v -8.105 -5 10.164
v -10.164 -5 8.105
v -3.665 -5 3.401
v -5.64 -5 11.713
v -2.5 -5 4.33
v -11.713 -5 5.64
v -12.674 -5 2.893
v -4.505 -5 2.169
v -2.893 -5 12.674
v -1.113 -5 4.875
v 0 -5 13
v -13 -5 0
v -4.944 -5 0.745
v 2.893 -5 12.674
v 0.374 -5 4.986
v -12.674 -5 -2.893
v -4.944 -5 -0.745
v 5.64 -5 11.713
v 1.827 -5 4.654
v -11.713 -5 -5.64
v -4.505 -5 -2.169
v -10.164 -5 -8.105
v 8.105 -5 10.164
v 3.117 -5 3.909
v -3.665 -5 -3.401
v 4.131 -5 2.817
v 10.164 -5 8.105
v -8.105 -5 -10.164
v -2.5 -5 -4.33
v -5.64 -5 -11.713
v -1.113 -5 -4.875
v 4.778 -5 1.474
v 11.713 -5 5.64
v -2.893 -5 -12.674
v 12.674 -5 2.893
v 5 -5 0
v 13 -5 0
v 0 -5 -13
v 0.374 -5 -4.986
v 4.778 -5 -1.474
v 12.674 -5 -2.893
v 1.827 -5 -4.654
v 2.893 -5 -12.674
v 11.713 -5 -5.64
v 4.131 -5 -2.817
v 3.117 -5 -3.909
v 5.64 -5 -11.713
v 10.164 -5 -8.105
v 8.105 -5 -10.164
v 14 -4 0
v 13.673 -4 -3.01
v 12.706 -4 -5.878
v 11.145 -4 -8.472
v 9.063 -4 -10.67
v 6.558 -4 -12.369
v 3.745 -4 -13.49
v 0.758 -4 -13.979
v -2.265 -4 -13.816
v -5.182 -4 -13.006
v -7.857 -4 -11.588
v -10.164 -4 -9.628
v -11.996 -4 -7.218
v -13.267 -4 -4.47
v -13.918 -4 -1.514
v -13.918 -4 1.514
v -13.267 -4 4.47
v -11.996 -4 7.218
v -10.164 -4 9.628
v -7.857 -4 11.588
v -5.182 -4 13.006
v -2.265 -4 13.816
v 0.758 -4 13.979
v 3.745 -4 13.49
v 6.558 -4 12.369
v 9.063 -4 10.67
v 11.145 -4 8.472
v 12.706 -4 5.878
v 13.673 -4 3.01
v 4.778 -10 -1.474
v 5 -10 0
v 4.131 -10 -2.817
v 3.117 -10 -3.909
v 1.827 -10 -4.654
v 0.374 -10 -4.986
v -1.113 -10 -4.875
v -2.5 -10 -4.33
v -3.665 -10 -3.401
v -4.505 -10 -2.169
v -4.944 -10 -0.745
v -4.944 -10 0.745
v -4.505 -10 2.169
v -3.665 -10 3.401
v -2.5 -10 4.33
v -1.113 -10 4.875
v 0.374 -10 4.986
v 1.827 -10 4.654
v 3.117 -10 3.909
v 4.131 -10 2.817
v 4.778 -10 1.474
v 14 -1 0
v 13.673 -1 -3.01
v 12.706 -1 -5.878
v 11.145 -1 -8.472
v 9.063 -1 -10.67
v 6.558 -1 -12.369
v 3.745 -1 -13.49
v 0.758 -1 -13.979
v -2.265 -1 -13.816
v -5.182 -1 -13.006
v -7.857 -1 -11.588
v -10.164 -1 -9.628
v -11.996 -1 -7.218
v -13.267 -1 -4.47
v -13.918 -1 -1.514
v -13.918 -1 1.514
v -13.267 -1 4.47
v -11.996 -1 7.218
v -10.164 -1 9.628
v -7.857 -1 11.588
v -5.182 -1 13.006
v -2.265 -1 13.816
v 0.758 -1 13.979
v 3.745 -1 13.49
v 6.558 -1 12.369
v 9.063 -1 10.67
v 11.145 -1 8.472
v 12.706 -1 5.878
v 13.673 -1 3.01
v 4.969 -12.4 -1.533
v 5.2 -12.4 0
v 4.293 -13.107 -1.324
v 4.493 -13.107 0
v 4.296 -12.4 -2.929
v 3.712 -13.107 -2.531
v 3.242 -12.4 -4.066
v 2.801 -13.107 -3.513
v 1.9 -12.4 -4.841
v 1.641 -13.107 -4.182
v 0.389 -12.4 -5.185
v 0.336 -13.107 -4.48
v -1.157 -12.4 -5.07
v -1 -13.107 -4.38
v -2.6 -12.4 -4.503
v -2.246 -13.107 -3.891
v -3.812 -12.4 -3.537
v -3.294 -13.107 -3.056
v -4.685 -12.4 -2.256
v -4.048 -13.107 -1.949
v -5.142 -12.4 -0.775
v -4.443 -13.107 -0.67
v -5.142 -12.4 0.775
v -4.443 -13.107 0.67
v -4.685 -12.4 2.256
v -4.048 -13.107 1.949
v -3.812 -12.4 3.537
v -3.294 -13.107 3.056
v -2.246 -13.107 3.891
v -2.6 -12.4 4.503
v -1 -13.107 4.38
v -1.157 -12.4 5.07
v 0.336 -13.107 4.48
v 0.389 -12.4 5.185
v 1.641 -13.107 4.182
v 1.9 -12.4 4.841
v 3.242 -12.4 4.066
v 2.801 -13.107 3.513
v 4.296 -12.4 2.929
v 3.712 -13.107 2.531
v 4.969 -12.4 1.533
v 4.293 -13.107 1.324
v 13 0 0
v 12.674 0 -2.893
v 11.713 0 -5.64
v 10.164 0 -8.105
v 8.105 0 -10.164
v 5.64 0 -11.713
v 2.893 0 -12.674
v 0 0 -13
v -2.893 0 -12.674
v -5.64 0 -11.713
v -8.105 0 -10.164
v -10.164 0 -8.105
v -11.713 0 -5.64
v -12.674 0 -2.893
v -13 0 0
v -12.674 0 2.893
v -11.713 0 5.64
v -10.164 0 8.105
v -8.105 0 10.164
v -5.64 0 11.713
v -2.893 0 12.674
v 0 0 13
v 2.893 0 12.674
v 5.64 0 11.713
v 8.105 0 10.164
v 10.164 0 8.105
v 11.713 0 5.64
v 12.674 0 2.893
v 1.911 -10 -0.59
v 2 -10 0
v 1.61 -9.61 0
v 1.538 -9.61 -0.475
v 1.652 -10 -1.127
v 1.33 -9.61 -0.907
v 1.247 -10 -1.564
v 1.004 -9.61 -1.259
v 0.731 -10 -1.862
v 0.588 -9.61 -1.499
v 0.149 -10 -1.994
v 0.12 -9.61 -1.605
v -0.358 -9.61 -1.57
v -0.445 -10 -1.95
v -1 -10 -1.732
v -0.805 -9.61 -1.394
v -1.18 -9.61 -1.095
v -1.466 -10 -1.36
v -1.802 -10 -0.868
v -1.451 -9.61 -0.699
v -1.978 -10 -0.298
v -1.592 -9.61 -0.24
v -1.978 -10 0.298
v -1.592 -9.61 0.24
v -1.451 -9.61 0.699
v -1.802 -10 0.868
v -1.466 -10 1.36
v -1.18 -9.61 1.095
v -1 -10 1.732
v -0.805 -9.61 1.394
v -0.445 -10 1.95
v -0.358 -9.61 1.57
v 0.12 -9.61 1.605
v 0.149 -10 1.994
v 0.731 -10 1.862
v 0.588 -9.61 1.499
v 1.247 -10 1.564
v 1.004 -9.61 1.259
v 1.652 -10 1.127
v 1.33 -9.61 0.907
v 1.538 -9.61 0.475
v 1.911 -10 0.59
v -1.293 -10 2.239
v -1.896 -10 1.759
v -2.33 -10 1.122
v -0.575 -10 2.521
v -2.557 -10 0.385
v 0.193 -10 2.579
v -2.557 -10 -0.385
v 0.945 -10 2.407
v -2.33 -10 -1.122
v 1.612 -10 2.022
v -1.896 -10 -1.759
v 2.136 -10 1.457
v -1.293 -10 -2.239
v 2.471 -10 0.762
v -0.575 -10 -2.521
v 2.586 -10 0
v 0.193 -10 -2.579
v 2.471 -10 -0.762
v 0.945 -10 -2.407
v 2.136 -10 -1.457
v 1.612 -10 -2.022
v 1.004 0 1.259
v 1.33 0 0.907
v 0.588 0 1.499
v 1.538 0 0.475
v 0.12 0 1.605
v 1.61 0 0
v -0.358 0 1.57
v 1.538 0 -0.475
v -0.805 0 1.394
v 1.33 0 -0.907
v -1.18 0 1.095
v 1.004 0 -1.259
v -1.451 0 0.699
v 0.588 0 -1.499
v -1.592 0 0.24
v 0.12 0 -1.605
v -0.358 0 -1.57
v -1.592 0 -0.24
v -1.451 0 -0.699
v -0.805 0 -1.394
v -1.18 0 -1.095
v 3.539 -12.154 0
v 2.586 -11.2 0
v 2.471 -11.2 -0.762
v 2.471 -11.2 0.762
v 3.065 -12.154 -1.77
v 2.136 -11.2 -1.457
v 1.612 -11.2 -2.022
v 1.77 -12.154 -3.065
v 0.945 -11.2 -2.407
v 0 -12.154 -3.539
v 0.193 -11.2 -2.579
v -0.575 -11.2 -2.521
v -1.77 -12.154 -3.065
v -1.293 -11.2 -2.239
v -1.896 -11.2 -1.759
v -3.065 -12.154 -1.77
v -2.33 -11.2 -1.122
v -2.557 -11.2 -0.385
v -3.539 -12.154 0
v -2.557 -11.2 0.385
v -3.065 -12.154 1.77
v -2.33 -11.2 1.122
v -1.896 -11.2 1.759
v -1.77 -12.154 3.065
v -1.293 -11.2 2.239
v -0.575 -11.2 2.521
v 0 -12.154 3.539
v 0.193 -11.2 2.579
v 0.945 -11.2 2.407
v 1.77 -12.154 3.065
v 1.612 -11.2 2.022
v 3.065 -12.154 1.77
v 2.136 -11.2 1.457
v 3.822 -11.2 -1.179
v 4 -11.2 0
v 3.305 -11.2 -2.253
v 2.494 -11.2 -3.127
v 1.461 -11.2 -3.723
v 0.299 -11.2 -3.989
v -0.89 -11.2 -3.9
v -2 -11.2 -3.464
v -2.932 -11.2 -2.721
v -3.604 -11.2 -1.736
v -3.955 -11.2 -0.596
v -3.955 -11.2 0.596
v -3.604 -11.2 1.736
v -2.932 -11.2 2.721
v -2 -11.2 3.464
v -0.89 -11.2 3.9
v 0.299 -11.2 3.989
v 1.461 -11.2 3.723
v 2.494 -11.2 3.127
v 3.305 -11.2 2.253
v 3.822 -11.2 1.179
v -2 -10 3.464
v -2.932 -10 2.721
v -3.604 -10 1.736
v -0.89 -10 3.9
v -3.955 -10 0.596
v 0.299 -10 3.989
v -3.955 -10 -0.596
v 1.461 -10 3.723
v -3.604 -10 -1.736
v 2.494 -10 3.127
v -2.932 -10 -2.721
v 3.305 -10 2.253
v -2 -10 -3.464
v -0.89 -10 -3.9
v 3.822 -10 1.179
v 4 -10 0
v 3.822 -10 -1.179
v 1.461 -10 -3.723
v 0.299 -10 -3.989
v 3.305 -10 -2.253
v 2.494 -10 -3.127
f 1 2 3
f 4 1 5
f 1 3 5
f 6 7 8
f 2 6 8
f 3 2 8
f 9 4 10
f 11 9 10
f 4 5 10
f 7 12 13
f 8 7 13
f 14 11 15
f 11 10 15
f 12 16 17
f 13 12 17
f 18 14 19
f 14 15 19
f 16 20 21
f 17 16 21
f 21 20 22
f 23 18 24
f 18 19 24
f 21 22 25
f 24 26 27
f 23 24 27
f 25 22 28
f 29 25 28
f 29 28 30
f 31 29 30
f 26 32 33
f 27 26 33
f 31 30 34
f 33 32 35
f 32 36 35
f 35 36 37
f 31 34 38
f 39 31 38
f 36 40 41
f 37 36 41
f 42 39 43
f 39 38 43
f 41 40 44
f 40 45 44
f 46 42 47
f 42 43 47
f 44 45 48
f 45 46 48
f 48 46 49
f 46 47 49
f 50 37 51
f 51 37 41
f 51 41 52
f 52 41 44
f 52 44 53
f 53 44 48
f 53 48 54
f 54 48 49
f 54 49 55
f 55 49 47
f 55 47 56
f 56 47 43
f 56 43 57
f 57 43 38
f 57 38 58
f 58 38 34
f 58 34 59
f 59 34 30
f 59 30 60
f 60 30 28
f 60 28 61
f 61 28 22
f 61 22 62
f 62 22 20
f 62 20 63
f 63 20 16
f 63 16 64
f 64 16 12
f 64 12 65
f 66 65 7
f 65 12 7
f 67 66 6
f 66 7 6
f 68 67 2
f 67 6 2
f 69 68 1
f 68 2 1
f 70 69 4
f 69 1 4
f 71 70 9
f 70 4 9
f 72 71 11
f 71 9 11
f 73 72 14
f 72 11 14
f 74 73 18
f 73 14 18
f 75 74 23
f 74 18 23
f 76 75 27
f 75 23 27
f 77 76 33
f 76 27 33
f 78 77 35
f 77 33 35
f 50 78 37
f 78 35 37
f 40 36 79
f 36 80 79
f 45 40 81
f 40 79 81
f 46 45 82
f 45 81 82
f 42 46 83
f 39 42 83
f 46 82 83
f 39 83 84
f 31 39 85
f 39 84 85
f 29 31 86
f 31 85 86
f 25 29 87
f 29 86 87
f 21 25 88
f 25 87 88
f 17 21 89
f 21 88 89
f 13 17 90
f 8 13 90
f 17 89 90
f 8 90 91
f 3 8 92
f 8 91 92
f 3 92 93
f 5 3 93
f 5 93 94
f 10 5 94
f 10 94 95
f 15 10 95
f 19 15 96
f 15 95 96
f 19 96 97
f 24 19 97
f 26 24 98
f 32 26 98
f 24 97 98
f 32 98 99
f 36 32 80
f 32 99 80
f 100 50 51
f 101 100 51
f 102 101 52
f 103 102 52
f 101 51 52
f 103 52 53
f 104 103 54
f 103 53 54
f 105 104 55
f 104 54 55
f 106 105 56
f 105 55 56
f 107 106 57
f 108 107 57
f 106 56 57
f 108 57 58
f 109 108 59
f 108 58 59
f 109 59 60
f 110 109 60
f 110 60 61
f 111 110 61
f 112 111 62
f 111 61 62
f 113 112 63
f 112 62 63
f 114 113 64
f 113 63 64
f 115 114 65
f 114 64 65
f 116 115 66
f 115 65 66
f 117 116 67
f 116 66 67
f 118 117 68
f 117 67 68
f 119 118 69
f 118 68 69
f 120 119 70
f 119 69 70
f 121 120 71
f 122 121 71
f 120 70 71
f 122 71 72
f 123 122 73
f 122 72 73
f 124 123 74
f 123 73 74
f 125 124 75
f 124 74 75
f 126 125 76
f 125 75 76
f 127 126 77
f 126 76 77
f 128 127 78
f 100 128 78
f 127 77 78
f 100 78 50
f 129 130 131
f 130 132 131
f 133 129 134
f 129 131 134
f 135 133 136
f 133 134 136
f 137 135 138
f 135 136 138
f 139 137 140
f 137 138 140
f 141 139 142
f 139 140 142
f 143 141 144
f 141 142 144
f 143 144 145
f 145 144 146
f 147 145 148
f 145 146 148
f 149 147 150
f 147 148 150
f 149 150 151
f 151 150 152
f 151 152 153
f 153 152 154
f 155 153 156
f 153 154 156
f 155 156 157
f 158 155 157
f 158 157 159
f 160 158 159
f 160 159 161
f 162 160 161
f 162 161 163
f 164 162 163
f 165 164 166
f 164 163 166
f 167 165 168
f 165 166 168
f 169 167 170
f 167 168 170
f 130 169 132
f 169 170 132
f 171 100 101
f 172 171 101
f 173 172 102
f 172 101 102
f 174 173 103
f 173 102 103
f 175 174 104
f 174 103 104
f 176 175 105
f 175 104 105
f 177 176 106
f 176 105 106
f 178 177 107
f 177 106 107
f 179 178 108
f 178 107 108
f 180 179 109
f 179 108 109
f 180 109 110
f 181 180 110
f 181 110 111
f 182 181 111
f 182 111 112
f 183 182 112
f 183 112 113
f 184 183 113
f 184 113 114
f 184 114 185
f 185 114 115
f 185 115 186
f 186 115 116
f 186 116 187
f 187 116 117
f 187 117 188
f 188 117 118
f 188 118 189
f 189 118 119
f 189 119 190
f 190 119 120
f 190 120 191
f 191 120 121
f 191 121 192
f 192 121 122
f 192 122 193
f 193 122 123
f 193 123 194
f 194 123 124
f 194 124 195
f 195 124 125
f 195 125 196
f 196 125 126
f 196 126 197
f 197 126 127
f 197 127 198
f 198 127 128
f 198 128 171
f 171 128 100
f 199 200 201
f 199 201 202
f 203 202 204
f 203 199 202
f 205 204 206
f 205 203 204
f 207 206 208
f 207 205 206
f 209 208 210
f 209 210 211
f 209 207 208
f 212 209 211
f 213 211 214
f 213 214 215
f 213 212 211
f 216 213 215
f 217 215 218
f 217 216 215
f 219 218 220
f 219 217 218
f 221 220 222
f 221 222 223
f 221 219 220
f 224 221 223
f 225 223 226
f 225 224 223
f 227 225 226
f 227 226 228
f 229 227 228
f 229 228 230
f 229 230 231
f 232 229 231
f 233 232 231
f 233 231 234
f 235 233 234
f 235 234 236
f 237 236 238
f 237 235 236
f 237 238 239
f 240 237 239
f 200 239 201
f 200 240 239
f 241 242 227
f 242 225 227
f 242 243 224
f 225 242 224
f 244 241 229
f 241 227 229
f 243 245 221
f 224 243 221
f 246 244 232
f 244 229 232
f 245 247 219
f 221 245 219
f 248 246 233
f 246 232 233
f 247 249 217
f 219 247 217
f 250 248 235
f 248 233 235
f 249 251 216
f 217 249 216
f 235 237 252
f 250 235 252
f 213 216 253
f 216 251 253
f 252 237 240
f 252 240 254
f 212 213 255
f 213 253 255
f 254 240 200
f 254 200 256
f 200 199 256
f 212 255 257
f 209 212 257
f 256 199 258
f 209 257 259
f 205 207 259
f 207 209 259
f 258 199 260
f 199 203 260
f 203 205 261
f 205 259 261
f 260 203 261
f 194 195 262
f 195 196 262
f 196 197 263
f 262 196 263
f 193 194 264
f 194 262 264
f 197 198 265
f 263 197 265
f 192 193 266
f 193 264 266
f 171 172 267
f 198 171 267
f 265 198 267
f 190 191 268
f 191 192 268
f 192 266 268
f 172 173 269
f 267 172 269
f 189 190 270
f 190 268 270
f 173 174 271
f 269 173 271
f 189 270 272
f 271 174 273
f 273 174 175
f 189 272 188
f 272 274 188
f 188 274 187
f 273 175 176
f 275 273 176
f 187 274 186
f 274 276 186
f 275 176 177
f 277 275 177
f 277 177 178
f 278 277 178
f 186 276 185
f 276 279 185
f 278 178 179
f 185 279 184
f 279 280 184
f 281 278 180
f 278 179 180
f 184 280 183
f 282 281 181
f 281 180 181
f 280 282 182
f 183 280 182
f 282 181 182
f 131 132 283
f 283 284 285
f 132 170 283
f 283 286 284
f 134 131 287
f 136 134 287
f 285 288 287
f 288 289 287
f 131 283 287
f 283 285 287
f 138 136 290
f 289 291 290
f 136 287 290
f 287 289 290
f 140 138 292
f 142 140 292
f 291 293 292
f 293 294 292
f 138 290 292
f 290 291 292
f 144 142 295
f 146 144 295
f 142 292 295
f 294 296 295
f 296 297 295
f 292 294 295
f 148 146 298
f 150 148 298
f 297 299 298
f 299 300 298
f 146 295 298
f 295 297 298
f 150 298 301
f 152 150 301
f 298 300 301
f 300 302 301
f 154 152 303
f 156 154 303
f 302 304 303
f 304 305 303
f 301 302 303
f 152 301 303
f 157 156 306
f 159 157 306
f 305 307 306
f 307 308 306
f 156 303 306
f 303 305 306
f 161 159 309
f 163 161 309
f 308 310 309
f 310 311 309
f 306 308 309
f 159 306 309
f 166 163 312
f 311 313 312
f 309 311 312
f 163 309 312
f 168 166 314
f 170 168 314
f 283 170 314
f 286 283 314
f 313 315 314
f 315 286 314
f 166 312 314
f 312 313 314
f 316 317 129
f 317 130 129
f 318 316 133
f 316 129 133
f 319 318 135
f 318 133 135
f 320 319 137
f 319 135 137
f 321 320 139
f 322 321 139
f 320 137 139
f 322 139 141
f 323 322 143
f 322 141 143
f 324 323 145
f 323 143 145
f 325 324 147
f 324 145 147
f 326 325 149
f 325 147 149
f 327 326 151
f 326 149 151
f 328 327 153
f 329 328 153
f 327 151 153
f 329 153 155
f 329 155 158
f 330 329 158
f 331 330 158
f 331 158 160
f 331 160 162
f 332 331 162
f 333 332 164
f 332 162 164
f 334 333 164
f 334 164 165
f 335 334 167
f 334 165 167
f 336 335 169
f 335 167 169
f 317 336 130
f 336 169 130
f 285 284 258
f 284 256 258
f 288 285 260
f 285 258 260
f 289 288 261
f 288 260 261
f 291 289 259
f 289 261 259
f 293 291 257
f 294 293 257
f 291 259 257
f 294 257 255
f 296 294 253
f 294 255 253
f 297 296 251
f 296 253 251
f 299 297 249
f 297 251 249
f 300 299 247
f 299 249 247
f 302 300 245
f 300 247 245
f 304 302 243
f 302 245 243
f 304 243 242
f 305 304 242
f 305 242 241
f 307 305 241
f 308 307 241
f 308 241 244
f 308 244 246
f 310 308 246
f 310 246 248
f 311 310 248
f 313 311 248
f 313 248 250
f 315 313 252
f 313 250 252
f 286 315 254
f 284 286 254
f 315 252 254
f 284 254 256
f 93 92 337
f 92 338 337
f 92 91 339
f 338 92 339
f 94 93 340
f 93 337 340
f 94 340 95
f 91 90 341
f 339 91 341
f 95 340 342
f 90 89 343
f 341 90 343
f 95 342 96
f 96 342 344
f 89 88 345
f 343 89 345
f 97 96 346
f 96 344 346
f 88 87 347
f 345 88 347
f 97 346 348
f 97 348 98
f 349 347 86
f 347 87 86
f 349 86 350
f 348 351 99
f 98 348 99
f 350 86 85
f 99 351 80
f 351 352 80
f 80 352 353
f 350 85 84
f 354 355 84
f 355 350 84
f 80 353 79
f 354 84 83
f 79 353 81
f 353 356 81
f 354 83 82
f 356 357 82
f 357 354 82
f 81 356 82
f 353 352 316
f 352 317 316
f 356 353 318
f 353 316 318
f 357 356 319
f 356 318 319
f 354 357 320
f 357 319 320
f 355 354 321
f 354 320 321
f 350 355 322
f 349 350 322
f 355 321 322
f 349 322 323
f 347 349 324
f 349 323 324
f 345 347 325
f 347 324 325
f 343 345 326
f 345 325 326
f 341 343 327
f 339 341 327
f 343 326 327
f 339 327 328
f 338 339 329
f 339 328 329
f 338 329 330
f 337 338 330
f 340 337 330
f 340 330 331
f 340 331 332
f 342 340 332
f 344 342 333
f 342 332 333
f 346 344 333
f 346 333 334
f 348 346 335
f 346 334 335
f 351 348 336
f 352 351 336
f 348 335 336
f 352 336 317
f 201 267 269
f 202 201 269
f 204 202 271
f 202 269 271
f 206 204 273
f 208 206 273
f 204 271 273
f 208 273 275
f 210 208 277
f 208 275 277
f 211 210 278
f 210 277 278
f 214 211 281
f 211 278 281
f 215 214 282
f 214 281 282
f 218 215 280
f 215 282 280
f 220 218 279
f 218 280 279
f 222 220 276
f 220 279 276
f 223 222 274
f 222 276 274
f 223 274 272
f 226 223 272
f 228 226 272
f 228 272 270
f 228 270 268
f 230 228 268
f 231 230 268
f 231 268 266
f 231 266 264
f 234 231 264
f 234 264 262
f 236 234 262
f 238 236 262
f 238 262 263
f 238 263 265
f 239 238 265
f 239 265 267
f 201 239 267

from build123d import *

# Parameters (mm, degrees)
SKETCH_2_R          = 1.61
CUT_EXTRUDE_1_DEPTH = 14.107106781
CHAMFER_1_SIZE      = 0.39
CHAMFER_2_SIZE      = 1


with BuildPart() as part:
    # Эскиз1 → Повернуть1 (revolve)
    with BuildSketch(Plane.XY):
        Polygon((0, 0), (14, 0), (14, -5), (5, -5), (5, -10), (4, -10), (4, -11.2), (5.2, -12.4), (4.492893219, -13.107106781), (2.585786438, -11.2), (2.585786438, -10), (0, -10), align=None)
    revolve(axis=Axis((0, -10, 0), (0, 1, 0)))

    # Эскиз2 → Вырез-Вытянуть1 (cut, through all)
    with BuildSketch(Plane(origin=(0, 0, 0), x_dir=(1, 0, 0), z_dir=(0, 1, 0))):
        Circle(SKETCH_2_R)
    extrude(amount=-CUT_EXTRUDE_1_DEPTH, mode=Mode.SUBTRACT)

    # Фаска1
    chamfer_1_edges = [part.edges().sort_by_distance(p)[0] for p in [
        (-1.61, -10, 0),
    ]]
    chamfer(chamfer_1_edges, length=CHAMFER_1_SIZE)

    # Фаска2
    chamfer_2_edges = [part.edges().sort_by_distance(p)[0] for p in [
        (-14, -5, 0),
        (-14, 0, 0),
    ]]
    chamfer(chamfer_2_edges, length=CHAMFER_2_SIZE)


solid = part.part
